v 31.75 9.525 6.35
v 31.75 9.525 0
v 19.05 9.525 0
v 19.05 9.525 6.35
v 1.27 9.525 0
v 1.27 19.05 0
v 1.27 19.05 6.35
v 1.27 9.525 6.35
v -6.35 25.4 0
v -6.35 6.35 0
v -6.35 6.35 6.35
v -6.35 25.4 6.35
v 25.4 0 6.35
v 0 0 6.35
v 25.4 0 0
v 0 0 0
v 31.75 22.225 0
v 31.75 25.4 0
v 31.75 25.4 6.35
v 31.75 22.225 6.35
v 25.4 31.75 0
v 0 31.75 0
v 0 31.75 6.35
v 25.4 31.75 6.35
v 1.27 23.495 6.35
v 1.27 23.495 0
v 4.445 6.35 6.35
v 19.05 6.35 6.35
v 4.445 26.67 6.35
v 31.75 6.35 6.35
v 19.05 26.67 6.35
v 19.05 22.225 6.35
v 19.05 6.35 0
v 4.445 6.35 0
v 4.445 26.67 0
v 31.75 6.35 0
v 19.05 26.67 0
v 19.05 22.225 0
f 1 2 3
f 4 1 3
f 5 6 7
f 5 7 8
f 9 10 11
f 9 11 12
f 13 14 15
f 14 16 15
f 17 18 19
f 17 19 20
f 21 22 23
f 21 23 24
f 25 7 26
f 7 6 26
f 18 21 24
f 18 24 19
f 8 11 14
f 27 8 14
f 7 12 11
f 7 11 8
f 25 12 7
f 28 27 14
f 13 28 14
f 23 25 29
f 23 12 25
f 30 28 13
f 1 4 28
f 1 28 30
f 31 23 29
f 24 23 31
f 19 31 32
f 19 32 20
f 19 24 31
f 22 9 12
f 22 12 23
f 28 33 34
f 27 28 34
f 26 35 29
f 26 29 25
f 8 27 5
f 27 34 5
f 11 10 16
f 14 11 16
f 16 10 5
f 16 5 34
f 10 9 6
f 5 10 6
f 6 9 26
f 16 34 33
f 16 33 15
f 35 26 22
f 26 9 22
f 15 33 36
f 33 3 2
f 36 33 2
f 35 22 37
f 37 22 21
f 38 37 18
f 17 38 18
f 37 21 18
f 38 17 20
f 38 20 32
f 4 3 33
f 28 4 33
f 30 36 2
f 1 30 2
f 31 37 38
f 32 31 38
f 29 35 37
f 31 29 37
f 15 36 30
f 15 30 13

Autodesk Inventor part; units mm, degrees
ref_plane "YZ Plane" through (0, 0, 0) normal (1, 0, 0) x (0, 1, 0)
ref_plane "XZ Plane" through (0, 0, 0) normal (0, 1, 0) x (-1, 0, 0)
ref_plane "XY Plane" through (0, 0, 0) normal (0, 0, 1) x (1, 0, 0)
sketch "Sketch1" plane through (0, 0, 0) normal (0, 0, 1) x (1, 0, 0)
  line L0 (0, 0) -> (25.4, 0)
  line L1 (-6.35, 6.35) -> (0, 0)
  line L2 (31.75, 6.35) -> (25.4, 0)
  line L3 (-6.35, 6.35) -> (-6.35, 25.4)
  line L4 (-6.35, 25.4) -> (0, 31.75)
  line L5 (0, 31.75) -> (25.4, 31.75)
  line L6 (25.4, 31.75) -> (31.75, 25.4)
  line L7 (31.75, 25.4) -> (31.75, 22.225)
  line L8 (31.75, 22.225) -> (19.05, 22.225)
  line L9 (19.05, 26.67) -> (19.05, 22.225)
  line L10 (1.27, 19.05) -> (1.27, 9.525)
  line L11 (4.445, 6.35) -> (1.27, 9.525)
  line L12 (1.27, 19.05) -> (1.27, 23.495)
  line L13 (4.445, 26.67) -> (1.27, 23.495)
  line L14 (31.75, 6.35) -> (31.75, 9.525)
  line L15 (31.75, 9.525) -> (19.05, 9.525)
  line L16 (19.05, 9.525) -> (19.05, 6.35)
  line L17 (19.05, 6.35) -> (4.445, 6.35)
  line L18 (4.445, 26.67) -> (19.05, 26.67)
  dimension "d0" = 25.4
  dimension "d6" = 19.05
  dimension "d7" = 25.4
  dimension "d8" = 3.175
  dimension "d9" = 12.7
  dimension "d21" = 3.175
  dimension "d22" = 12.7
  dimension "d23" = 3.175
extrude "Extrusion1" add sketch "Sketch1" along normal blind 6.35
properties part number "Assignment 2.1 - C-Clip"
